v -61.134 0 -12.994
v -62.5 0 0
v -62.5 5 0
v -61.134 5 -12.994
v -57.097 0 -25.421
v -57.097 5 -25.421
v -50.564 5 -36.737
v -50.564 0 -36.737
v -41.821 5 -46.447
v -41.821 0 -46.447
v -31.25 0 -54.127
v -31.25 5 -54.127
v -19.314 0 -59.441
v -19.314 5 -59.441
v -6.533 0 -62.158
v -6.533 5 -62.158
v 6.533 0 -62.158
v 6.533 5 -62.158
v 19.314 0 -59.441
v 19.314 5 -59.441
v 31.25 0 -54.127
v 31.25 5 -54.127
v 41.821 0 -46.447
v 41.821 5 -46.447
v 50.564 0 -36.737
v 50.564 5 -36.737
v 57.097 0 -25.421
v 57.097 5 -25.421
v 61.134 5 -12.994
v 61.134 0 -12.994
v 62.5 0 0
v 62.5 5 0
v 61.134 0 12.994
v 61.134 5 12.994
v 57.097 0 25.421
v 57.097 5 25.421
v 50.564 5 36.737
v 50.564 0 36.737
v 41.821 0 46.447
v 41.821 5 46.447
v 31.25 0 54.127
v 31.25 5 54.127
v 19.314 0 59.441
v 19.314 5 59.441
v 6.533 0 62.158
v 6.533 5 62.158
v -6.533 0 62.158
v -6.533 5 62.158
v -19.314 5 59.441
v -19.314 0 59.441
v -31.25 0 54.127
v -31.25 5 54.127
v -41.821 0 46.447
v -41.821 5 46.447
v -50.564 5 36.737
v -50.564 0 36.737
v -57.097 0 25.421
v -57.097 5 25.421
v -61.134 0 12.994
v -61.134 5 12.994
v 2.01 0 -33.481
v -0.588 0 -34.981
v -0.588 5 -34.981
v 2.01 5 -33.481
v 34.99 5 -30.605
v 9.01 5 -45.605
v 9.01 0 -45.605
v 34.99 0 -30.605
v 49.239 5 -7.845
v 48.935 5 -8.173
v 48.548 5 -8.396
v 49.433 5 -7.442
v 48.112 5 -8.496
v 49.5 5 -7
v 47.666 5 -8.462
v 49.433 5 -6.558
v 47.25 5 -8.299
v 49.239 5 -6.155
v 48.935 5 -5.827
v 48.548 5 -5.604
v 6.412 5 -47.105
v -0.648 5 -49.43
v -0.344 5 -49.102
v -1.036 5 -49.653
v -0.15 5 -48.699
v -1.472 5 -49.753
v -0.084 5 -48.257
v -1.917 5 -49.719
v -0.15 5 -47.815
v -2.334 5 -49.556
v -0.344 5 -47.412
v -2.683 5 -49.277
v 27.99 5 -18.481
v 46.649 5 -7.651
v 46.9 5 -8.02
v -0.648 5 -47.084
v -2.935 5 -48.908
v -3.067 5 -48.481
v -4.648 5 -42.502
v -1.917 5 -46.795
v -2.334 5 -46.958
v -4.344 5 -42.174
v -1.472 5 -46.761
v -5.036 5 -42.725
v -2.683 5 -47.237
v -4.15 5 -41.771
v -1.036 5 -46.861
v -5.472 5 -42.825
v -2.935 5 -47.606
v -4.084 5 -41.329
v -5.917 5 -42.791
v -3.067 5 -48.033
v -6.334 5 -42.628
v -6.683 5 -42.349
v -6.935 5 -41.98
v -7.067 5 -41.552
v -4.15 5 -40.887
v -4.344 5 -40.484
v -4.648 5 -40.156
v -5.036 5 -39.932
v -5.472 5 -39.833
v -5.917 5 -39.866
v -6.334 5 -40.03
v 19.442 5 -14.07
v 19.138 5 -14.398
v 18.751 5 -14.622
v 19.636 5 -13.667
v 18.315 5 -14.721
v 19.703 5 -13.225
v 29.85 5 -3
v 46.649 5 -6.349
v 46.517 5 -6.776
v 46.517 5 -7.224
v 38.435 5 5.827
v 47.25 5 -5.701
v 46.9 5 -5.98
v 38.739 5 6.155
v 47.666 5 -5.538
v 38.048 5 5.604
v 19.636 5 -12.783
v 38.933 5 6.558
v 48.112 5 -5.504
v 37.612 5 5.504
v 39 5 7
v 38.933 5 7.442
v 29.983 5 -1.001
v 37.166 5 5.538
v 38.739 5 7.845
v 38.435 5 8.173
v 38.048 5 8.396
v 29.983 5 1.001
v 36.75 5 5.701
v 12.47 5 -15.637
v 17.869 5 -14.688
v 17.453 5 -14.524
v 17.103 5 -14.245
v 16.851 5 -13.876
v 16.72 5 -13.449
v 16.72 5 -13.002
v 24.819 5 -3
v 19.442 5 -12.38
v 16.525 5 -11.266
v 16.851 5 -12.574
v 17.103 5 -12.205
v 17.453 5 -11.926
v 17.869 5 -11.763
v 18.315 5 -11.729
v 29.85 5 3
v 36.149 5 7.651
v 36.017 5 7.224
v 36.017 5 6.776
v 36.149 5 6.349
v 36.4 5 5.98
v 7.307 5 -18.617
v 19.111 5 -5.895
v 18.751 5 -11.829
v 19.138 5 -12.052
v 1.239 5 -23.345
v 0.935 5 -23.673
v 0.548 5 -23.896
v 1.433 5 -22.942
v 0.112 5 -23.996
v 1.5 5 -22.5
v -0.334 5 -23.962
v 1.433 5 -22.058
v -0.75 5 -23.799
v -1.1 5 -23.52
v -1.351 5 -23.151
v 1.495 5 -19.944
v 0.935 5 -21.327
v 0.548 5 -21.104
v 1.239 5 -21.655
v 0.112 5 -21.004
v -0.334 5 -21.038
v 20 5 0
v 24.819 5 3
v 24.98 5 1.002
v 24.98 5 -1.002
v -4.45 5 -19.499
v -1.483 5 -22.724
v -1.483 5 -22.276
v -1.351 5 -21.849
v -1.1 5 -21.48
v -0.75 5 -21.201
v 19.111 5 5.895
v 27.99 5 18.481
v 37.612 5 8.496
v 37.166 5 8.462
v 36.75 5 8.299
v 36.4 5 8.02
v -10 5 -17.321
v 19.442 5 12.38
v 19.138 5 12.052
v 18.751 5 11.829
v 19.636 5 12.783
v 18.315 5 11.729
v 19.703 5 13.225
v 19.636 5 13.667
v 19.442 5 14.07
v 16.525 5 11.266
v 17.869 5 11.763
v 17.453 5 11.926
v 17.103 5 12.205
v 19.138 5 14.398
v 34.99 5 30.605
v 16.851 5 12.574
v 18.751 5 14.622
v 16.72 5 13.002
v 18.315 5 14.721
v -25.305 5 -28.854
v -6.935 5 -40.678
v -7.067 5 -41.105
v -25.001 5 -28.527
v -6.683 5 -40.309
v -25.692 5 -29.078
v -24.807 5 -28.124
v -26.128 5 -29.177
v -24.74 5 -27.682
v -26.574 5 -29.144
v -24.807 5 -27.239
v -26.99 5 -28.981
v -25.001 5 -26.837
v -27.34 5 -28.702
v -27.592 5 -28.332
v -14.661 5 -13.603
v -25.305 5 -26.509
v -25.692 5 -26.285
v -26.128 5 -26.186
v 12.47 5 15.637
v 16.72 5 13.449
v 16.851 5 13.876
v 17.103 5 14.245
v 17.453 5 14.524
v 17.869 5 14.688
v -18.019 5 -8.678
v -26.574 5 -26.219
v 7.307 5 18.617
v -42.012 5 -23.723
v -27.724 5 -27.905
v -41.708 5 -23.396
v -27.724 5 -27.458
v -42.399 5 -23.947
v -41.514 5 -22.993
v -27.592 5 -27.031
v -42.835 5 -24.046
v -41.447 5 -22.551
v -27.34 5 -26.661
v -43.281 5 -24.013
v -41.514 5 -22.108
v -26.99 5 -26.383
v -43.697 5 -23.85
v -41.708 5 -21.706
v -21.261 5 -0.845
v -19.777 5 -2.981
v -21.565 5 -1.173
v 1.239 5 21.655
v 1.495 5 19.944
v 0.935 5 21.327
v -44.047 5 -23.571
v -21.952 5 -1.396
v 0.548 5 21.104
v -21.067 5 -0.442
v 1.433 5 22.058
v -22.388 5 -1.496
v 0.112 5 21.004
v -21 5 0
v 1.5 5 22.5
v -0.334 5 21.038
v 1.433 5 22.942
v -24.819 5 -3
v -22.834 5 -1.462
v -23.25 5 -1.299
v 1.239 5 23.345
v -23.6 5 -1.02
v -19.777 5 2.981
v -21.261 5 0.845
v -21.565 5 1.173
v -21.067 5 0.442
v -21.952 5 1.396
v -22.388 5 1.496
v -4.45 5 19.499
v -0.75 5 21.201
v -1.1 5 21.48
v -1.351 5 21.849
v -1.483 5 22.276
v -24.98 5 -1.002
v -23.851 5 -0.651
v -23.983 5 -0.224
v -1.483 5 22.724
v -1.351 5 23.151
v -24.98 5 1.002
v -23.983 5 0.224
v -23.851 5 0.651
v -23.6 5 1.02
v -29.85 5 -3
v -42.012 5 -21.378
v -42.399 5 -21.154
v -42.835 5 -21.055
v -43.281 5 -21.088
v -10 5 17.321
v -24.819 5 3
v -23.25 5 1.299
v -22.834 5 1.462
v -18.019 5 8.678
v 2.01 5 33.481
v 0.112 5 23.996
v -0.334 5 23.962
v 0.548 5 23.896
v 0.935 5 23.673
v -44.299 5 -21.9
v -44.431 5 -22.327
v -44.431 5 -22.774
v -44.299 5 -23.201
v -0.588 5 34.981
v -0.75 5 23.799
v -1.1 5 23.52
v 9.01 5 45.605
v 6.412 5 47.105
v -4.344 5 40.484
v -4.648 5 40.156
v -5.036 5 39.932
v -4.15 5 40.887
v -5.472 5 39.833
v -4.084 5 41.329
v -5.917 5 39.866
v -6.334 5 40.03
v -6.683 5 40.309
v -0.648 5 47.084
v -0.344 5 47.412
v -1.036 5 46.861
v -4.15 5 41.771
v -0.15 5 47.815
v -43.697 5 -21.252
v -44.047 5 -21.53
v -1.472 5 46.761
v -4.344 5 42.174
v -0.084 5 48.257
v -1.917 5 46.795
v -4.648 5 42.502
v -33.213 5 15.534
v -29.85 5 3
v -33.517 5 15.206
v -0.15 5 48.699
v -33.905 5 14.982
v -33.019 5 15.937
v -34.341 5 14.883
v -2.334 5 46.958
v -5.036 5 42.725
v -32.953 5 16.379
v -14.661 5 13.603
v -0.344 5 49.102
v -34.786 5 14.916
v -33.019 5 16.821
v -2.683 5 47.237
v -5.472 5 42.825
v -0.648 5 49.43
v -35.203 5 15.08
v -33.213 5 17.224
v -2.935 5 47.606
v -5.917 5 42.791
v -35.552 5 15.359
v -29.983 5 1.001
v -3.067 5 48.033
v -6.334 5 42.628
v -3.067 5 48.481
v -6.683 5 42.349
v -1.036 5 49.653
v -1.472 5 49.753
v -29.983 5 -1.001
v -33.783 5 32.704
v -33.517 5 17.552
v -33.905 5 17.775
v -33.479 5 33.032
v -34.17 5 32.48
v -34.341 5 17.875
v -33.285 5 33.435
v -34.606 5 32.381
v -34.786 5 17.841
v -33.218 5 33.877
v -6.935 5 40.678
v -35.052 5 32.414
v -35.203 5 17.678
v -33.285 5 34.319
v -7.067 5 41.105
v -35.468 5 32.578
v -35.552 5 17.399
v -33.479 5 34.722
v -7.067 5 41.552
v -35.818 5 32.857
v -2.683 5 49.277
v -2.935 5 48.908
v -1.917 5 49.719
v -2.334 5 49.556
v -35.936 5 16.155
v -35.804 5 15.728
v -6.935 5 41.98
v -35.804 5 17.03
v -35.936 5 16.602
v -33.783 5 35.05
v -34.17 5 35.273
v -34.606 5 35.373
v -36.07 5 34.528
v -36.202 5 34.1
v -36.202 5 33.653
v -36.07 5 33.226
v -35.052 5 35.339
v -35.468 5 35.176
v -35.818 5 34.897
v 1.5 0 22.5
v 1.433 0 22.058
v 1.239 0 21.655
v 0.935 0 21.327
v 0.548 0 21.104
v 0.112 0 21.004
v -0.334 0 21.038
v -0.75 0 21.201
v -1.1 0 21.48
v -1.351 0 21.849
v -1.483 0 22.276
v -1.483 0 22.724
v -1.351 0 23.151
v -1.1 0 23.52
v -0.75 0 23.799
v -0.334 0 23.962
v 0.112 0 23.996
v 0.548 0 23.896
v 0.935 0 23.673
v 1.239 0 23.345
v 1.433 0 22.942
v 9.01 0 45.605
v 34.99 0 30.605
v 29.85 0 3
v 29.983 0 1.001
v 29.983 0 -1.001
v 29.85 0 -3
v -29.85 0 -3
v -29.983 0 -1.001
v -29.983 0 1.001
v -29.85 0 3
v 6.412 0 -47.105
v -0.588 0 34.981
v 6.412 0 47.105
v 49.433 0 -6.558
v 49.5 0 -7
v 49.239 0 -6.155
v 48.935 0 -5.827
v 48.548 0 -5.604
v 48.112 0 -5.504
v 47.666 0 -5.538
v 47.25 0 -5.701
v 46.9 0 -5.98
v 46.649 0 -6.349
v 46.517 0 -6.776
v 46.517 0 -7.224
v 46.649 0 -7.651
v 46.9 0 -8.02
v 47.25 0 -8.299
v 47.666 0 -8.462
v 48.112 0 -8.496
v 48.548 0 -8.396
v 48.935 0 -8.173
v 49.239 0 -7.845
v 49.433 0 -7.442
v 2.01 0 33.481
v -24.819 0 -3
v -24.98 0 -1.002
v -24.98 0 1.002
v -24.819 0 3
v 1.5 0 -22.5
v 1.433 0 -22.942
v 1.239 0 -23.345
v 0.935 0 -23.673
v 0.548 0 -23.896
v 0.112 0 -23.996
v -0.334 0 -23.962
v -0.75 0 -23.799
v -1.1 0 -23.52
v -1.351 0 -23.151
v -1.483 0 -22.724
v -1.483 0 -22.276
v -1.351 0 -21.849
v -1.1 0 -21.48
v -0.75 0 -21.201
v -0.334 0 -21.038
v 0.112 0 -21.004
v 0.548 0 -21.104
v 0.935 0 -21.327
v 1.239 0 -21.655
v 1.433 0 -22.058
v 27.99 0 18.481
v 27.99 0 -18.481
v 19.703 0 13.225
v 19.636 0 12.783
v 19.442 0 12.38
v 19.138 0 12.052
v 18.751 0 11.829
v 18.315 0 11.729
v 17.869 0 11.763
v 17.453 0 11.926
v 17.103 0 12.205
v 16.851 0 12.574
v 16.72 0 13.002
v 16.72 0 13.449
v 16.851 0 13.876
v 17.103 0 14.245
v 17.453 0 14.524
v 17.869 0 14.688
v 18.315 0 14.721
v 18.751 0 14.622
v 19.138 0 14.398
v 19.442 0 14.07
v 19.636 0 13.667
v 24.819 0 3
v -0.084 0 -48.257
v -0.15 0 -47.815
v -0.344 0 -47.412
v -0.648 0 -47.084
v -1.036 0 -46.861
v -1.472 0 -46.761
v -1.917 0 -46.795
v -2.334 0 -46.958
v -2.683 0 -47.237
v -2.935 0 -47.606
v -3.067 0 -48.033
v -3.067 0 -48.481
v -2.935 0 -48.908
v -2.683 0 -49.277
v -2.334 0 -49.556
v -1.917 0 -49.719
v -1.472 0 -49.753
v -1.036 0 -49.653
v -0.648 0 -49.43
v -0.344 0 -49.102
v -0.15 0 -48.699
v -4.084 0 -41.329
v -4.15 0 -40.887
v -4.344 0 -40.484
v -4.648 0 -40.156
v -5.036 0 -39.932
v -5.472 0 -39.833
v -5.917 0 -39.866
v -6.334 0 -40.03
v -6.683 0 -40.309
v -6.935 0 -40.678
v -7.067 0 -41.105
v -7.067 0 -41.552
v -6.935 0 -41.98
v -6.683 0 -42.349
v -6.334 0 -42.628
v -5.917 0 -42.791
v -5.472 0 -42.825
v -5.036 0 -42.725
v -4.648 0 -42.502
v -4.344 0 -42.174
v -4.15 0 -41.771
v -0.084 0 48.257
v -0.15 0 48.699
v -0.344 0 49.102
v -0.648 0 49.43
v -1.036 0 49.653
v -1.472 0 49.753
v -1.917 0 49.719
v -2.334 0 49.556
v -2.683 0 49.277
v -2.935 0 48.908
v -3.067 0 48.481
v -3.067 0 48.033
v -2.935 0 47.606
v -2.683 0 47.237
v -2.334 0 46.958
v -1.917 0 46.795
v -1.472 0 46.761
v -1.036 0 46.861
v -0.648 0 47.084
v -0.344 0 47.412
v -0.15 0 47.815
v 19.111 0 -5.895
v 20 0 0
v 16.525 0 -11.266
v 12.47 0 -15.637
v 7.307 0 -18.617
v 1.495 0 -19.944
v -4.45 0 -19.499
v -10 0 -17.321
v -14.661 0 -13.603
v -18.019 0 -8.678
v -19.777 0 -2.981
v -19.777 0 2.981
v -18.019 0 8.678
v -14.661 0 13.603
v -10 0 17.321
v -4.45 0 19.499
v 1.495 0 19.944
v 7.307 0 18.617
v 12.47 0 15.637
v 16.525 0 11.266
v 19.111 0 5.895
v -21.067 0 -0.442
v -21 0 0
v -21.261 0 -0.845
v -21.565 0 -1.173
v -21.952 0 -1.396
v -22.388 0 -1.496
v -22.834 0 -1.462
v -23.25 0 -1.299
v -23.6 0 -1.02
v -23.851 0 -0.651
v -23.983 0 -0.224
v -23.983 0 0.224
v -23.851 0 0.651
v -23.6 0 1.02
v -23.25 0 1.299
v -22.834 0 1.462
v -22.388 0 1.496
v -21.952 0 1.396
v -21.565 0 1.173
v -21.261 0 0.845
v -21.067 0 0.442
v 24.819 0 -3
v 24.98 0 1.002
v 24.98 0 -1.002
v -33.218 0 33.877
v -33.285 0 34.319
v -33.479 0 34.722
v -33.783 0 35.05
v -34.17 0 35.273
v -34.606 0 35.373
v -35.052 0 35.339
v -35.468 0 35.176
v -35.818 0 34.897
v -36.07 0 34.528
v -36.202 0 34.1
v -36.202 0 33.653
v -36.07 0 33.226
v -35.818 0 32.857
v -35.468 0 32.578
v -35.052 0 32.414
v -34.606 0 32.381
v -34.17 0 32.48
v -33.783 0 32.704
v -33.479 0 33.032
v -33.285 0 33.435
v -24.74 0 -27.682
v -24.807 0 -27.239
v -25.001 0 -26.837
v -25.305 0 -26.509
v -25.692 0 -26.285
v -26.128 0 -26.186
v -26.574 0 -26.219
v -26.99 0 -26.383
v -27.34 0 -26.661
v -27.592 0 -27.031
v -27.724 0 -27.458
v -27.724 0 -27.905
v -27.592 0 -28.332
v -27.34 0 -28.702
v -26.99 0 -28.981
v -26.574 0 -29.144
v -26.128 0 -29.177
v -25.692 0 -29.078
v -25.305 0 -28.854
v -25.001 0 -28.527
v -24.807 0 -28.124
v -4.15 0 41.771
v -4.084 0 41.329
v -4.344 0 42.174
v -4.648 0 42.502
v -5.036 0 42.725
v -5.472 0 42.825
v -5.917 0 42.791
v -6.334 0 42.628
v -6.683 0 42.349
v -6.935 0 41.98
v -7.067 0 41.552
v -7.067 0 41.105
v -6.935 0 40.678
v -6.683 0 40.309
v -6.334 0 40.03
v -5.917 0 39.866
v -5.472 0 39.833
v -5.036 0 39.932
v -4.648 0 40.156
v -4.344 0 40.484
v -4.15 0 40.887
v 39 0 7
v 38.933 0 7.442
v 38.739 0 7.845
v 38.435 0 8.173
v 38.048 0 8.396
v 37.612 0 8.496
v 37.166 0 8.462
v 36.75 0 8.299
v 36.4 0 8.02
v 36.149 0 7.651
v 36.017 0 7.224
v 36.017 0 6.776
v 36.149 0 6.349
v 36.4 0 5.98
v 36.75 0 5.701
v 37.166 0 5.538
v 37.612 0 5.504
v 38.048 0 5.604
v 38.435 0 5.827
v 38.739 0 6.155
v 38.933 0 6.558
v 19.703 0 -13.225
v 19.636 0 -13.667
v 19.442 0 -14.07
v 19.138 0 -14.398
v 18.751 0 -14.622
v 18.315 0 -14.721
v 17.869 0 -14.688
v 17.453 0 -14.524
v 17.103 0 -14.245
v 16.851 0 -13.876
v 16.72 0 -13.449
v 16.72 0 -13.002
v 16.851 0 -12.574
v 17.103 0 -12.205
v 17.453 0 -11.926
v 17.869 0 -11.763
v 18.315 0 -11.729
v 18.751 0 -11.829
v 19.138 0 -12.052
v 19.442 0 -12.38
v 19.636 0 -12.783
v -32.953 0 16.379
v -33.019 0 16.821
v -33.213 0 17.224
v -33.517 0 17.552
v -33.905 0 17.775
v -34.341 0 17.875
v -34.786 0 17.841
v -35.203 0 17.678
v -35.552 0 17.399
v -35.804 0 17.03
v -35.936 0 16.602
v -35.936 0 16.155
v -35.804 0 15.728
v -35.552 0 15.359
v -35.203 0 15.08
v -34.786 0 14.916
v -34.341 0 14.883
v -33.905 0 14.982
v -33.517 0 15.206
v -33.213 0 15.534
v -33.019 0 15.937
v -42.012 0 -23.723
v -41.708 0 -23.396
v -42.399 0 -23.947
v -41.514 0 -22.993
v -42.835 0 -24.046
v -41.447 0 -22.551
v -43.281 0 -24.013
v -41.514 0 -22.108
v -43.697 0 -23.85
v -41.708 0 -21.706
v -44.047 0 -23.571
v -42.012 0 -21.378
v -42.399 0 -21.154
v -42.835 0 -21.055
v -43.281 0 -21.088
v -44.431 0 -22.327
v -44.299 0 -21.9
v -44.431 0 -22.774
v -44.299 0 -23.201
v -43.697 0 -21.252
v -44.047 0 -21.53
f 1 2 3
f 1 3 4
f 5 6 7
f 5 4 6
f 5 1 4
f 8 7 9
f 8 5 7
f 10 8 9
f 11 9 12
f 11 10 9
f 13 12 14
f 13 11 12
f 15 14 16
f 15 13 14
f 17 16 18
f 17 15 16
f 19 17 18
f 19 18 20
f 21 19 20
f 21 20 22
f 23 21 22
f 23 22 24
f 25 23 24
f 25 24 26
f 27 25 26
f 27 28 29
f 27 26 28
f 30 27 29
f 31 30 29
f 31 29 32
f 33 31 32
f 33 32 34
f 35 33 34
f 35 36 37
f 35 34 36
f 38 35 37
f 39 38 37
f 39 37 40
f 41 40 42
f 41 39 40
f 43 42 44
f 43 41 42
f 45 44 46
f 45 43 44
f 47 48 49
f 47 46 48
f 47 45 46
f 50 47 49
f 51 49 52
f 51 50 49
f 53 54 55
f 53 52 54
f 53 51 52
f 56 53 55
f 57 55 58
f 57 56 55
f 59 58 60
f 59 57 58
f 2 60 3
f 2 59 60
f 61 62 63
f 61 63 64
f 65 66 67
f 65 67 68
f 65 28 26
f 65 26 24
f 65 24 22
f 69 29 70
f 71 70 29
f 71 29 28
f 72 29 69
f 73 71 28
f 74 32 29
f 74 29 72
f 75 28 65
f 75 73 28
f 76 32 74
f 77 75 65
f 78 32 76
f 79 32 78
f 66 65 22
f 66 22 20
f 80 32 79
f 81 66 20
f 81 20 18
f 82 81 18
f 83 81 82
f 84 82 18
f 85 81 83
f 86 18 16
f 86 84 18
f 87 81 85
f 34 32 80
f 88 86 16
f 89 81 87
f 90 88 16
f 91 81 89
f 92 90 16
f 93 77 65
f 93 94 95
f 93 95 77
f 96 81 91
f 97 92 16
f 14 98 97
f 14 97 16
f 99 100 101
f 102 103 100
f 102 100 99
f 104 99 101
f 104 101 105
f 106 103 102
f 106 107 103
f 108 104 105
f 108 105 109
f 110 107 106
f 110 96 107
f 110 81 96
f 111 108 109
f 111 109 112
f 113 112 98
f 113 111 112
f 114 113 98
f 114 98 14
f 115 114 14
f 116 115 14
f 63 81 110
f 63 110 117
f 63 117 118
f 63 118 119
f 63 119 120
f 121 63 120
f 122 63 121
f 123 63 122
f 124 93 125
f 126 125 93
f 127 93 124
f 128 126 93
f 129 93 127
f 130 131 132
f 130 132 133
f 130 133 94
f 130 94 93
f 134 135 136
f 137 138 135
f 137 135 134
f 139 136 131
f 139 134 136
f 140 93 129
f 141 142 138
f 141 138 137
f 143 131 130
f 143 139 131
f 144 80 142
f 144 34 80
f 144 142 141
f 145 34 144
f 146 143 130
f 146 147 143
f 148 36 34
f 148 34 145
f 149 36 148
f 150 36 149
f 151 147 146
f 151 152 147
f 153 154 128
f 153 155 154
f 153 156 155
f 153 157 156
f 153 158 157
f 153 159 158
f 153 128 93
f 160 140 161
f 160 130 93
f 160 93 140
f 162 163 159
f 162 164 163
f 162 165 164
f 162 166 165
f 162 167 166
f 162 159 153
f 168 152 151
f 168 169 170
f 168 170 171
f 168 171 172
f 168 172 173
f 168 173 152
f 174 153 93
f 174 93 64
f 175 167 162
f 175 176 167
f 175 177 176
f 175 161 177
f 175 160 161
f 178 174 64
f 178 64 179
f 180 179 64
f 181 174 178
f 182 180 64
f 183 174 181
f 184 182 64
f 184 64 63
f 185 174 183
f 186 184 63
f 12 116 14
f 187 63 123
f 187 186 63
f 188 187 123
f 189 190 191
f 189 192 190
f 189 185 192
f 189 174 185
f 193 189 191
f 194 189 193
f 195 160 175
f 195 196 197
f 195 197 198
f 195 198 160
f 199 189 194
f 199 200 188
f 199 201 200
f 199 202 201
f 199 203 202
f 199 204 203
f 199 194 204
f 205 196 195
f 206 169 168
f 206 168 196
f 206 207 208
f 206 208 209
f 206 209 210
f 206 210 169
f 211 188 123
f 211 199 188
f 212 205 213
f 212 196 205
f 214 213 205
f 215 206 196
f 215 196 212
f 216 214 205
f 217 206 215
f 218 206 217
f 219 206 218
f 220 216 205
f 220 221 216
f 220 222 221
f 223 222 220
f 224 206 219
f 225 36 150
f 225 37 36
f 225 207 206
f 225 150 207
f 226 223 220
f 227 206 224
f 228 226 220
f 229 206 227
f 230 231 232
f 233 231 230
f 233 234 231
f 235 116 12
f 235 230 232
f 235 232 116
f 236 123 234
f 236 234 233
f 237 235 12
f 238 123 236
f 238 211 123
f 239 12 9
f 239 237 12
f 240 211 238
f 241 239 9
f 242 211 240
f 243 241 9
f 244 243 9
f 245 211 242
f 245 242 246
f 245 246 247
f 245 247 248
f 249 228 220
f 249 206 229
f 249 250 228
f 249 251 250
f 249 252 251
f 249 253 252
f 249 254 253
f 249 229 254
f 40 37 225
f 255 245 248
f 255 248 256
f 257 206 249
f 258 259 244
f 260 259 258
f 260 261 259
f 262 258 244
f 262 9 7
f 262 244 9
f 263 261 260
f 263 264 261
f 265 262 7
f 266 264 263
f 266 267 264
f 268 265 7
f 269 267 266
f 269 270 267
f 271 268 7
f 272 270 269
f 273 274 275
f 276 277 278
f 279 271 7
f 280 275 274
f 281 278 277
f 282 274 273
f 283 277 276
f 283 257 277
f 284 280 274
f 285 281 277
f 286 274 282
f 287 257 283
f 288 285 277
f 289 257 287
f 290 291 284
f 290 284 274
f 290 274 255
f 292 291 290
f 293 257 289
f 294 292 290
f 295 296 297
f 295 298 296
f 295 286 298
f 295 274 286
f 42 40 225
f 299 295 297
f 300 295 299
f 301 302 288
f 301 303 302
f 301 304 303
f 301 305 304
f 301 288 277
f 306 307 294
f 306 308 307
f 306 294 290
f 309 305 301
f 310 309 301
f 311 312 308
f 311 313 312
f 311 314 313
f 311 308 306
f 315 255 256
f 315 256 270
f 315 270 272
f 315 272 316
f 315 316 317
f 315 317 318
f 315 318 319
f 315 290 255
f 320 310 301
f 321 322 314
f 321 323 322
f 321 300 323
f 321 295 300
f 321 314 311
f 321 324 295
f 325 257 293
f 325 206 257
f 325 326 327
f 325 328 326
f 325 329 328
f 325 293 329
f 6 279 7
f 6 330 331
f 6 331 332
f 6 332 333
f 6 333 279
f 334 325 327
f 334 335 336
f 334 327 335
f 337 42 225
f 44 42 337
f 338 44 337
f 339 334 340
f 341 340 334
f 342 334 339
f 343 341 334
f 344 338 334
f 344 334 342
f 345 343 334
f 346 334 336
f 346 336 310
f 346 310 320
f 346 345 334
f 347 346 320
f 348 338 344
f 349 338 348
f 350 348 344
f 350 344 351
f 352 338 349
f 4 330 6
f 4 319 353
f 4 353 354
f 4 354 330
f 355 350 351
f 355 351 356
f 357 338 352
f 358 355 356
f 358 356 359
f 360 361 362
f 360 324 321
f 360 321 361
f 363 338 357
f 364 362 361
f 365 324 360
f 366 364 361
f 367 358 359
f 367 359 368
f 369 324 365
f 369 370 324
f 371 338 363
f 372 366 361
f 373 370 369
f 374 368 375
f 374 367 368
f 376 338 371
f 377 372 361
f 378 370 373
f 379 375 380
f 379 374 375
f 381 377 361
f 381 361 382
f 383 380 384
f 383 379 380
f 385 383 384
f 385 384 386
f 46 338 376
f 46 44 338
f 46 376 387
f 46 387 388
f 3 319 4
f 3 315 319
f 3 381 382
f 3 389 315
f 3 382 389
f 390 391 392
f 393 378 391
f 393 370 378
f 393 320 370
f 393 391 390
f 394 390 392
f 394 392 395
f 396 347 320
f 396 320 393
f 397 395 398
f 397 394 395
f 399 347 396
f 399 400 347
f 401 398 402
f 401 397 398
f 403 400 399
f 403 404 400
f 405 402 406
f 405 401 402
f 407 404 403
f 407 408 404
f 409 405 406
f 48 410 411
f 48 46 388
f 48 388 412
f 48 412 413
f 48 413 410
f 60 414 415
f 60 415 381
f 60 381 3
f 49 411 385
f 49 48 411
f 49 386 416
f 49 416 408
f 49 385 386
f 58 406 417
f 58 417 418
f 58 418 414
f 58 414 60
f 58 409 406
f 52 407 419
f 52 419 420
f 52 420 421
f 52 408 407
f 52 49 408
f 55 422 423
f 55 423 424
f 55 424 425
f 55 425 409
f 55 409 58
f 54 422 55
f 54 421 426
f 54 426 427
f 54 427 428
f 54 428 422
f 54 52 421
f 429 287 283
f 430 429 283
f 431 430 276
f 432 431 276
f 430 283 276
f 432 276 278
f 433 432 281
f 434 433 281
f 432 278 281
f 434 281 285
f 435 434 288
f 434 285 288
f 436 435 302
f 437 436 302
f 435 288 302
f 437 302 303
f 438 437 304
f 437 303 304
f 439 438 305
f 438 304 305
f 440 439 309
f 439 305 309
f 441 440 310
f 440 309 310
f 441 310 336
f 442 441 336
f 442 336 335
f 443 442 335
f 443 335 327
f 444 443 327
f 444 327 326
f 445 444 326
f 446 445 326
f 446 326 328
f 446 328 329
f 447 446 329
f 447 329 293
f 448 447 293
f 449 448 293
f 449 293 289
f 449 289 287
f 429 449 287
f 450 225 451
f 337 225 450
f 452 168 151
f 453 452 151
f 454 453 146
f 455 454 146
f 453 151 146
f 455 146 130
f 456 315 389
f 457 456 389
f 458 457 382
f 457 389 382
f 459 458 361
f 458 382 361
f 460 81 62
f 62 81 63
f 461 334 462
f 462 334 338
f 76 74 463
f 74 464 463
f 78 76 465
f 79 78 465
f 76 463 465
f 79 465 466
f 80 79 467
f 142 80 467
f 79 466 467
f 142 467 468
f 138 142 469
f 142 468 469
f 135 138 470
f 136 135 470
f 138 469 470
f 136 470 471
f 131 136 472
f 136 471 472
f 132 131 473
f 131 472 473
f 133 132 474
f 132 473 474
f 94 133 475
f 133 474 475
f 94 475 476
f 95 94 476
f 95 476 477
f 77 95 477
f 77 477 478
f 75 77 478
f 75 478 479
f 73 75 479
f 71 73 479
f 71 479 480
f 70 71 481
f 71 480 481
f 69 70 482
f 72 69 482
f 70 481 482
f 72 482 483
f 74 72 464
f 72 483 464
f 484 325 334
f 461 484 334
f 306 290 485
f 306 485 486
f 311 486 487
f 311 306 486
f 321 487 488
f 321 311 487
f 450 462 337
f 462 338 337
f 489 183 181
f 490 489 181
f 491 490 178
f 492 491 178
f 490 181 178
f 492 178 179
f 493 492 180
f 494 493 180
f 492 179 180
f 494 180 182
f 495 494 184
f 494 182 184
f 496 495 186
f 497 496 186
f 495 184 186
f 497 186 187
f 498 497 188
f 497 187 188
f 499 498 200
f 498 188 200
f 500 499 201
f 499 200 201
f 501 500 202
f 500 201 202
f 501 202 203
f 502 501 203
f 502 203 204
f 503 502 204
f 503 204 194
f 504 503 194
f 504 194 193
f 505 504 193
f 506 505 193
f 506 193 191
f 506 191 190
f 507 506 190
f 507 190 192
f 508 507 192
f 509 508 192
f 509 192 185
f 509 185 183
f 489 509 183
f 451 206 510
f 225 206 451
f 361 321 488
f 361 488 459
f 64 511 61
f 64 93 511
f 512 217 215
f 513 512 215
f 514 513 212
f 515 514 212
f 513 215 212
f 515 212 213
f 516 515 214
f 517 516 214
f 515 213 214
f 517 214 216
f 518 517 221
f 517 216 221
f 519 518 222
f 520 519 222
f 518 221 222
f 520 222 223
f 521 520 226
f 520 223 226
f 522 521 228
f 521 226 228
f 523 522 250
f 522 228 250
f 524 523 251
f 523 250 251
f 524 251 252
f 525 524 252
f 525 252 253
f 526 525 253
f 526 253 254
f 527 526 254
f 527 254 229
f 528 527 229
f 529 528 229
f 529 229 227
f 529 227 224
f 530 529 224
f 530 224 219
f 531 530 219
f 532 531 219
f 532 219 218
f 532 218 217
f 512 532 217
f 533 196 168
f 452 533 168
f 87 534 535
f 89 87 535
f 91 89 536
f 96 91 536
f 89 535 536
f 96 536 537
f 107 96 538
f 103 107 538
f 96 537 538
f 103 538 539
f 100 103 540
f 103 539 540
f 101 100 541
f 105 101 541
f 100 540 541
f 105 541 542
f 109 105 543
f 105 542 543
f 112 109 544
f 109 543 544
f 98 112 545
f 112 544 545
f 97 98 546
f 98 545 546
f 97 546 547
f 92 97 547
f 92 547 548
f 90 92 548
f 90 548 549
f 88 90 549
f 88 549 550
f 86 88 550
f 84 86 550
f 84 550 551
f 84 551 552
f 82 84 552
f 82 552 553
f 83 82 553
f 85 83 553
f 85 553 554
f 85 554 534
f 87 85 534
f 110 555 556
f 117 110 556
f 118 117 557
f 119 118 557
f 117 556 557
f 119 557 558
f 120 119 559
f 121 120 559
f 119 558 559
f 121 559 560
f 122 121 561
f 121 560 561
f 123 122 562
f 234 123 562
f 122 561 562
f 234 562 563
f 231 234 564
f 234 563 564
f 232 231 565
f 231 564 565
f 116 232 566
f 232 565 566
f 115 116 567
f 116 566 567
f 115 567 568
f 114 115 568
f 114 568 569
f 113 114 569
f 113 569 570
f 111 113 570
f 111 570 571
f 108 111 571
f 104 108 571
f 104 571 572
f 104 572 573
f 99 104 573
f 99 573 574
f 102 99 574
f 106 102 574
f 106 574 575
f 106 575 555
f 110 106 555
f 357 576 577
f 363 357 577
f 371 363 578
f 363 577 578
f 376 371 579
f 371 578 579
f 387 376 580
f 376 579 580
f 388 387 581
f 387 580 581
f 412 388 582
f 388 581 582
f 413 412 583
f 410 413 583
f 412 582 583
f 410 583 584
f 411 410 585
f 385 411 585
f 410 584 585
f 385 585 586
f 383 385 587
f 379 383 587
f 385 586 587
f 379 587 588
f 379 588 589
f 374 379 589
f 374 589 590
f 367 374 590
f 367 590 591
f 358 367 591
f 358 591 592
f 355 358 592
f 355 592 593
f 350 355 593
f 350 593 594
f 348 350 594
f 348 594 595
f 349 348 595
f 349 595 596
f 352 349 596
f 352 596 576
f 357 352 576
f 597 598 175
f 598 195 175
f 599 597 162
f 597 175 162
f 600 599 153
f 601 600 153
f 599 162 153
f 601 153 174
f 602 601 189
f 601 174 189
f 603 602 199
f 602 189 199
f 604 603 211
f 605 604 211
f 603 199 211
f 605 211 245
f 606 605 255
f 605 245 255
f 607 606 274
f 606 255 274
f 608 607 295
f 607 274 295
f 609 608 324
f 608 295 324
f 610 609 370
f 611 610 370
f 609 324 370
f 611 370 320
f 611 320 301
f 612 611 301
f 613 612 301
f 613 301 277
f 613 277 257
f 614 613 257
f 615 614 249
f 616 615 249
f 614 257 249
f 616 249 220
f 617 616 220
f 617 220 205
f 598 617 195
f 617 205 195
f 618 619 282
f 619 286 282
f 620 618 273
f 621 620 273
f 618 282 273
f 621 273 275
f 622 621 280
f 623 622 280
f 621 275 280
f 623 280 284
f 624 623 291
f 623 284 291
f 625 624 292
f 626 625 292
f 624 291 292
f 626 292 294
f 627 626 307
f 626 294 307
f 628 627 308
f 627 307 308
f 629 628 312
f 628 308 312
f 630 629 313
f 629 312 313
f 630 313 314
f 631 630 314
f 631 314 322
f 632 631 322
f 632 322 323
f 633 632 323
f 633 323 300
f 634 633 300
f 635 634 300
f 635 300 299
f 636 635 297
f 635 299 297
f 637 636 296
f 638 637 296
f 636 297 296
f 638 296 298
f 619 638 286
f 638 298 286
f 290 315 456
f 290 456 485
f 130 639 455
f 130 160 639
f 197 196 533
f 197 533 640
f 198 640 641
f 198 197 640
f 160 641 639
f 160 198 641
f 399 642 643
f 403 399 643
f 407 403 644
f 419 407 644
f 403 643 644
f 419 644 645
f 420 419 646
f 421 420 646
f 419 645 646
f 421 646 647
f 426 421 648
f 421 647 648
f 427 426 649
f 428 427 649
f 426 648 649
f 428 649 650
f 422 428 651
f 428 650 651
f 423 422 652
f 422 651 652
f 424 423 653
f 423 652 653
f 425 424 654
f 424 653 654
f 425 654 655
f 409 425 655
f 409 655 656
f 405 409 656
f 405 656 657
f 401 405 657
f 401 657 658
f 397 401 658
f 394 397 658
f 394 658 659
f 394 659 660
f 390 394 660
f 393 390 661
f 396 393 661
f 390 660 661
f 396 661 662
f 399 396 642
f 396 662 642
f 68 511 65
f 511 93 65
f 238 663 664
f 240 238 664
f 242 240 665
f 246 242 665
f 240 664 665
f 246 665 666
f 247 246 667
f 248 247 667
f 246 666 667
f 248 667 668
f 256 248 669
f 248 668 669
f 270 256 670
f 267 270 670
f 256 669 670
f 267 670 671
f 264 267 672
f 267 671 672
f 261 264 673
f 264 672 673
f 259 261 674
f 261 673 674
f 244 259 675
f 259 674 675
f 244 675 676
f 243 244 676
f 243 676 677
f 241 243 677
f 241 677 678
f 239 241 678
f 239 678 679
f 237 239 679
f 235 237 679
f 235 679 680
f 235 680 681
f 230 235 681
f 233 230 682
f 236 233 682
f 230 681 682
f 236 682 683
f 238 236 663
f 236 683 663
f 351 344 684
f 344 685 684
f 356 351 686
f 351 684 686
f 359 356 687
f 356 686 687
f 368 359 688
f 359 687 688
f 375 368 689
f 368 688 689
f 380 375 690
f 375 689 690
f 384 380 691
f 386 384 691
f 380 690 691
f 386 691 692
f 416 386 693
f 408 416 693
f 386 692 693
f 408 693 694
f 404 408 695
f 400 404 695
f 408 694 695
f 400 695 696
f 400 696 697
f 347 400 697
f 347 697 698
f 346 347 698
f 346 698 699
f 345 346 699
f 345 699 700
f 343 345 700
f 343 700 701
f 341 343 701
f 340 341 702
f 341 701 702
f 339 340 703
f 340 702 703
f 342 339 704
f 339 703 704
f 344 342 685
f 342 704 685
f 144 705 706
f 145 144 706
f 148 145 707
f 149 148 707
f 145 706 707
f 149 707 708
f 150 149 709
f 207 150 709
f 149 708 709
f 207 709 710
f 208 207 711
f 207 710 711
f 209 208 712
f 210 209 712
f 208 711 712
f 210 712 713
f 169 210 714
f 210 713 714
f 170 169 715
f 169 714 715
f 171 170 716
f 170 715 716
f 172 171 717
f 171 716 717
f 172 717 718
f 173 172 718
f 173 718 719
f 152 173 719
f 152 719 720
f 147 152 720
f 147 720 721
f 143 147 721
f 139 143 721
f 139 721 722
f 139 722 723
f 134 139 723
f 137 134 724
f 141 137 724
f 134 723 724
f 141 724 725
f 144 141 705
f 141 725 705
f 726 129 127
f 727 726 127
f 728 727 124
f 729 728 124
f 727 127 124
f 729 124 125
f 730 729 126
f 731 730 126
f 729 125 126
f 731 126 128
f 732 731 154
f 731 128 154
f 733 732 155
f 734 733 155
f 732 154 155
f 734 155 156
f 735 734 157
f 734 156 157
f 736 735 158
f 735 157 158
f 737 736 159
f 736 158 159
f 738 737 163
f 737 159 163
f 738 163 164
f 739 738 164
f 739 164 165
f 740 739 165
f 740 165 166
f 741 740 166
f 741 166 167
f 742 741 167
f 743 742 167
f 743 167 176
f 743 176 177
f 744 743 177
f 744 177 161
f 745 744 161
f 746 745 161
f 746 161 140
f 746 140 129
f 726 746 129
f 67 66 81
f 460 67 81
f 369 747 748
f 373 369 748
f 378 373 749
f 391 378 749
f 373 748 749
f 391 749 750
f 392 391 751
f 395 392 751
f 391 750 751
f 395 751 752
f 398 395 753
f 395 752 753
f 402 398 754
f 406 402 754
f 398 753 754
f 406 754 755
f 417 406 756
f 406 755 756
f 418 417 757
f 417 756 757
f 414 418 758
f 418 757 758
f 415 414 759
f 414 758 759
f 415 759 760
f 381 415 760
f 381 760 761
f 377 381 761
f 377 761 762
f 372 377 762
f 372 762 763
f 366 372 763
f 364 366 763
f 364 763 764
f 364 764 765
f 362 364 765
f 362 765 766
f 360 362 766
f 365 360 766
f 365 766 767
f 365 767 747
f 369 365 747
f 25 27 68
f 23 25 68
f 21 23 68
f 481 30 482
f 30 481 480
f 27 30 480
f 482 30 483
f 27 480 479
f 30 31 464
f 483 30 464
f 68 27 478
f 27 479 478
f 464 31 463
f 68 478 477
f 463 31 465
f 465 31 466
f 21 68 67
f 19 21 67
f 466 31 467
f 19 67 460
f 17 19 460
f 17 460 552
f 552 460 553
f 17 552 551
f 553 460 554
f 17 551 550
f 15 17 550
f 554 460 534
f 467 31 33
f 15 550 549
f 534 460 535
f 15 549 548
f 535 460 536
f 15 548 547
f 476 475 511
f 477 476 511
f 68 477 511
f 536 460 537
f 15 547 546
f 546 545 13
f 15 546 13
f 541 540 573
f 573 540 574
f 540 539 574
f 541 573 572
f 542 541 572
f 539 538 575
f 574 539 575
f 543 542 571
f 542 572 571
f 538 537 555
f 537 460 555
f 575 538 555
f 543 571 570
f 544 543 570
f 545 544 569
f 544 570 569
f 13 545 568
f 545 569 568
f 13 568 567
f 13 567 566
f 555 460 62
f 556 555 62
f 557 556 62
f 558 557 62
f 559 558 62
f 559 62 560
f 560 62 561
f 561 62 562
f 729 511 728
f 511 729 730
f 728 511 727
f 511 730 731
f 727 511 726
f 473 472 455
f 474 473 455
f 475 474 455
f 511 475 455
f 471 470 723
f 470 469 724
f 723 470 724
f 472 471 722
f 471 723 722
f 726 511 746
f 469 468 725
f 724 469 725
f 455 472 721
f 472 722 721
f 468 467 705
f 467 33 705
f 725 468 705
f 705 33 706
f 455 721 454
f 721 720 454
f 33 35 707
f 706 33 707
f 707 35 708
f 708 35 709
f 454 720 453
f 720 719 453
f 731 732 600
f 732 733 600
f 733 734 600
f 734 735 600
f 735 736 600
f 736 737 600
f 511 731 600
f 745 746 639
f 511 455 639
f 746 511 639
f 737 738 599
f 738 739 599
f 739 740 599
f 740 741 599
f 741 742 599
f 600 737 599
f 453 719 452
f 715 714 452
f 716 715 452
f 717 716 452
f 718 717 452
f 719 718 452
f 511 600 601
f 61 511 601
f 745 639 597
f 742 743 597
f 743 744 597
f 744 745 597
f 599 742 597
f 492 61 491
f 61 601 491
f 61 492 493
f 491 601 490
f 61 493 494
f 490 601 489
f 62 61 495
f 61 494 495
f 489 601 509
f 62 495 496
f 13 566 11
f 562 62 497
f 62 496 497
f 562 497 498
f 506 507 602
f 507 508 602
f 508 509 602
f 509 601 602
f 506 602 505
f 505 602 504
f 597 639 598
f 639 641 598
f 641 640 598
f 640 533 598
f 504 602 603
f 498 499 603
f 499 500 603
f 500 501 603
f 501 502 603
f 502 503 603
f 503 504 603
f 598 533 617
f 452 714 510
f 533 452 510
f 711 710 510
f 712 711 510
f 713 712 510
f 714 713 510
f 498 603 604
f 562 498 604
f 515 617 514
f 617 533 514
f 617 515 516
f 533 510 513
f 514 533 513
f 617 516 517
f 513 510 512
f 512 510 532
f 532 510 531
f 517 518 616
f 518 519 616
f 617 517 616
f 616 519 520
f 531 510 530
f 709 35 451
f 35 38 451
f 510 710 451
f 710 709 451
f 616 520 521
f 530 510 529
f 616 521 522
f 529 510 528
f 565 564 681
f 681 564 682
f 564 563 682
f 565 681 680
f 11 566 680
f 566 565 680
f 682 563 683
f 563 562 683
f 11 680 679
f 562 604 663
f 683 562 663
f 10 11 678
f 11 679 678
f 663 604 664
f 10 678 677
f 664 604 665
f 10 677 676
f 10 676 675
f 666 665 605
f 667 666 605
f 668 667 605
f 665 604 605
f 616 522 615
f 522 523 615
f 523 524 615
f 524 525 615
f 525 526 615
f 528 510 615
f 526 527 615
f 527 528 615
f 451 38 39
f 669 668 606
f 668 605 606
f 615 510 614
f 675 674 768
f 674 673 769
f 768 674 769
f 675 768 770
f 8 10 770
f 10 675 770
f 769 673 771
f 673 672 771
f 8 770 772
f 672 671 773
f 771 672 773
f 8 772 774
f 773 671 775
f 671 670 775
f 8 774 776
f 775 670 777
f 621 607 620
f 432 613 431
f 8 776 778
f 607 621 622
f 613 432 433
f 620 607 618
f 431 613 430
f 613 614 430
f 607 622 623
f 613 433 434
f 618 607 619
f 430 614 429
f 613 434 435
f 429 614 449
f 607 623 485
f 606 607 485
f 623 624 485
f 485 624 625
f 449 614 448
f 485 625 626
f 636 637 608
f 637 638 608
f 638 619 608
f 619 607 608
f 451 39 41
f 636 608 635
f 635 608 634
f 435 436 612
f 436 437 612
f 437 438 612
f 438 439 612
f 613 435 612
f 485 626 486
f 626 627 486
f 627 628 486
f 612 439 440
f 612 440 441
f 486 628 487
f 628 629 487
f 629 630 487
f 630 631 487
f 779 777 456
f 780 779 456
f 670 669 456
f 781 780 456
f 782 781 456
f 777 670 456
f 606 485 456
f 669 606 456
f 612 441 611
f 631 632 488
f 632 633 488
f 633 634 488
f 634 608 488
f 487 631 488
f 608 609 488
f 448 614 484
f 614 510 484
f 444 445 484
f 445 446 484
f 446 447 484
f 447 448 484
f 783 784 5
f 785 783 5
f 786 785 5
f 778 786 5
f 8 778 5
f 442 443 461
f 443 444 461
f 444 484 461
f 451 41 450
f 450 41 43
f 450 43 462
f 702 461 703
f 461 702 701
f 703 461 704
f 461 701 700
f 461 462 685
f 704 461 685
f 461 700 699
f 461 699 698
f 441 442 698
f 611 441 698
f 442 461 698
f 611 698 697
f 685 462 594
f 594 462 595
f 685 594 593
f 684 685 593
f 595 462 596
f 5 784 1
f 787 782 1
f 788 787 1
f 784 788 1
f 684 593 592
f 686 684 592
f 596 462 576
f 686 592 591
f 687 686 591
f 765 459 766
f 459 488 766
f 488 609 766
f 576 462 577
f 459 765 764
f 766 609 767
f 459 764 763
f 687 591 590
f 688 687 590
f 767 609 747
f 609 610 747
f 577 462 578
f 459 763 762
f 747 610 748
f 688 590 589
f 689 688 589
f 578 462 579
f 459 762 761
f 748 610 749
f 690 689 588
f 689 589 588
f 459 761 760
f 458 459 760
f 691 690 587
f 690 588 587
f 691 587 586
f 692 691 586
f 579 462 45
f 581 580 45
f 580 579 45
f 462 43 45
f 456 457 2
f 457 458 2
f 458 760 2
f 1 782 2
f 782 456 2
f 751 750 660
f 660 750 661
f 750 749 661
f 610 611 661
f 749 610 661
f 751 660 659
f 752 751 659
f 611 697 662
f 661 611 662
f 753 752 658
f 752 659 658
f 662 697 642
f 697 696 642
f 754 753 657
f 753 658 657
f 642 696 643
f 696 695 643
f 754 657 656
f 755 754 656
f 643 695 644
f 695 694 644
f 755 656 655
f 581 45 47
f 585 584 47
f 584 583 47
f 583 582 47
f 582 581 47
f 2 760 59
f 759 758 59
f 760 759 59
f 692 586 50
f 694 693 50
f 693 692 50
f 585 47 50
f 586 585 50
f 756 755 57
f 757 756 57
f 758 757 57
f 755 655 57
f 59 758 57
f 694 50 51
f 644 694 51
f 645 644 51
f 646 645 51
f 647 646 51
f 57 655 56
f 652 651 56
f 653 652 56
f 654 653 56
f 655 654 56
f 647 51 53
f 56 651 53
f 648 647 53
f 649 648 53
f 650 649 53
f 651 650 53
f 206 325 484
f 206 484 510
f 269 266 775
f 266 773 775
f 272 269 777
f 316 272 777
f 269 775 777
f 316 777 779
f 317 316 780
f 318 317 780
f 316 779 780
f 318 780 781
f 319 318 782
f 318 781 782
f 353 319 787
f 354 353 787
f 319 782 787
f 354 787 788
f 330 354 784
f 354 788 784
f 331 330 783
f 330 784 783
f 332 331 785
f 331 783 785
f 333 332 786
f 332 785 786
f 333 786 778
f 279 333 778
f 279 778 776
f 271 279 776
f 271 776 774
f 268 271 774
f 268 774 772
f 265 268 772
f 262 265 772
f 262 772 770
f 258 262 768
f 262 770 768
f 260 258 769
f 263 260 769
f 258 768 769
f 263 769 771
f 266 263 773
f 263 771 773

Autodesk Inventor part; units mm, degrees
ref_plane "YZ Plane" through (0, 0, 0) normal (1, 0, 0) x (0, 1, 0)
ref_plane "XZ Plane" through (0, 0, 0) normal (0, 1, 0) x (-1, 0, 0)
ref_plane "XY Plane" through (0, 0, 0) normal (0, 0, 1) x (1, 0, 0)
sketch "Sketch1" plane through (0, 0, 0) normal (0, 1, 0) x (-1, 0, 0)
  line L0 (0, 0) -> (50, 0) construction
  line L1 (0, 0) -> (50, 0) construction
  line L2 (0, 0) -> (-36, 0)
  circle A0 centre (0, 0) radius 25
  line L3 (-60, -10) -> (-60, 10)
  circle A1 centre (0, 0) radius 61
  circle A2 centre (0, 0) radius 62.5
  point P0 (62.509, -33.0548)
  point P1 (12.6591, 21.558)
  point P2 (24.4148, 5.3777)
  point P3 (24.4148, -5.3777)
  point P4 (-22.9129, 10)
  point P5 (-22.9129, -10)
  point P6 (12.6591, -21.558)
  dimension "d2" = 36
  dimension "d3" = 50
  dimension "d26" = 122
  dimension "d154" = 125
extrude "Extrusion1" add sketch "Sketch1" along normal blind 5 contours A0 | A1 | A2
sketch "Sketch2" plane through (0, 5, 0) normal (0, 1, 0) x (1, 0, 0)
  circle A0 centre (0, 0) radius 20
  dimension "d6" = 40
extrude "Extrusion2" cut sketch "Sketch2" against normal up to next
sketch "Sketch3" plane through (0, 5, 0) normal (0, 1, 0) x (1, 0, 0)
  line L0 (22.1416, 4) -> (20.8701, 4)
  line L1 (22.1416, -4) -> (20.8701, -4)
  line L2 (24.6779, 4) -> (22.1416, 4)
  line L3 (24.6779, -4) -> (22.1416, -4)
  line L4 (-15.5618, -16.2506) -> (-14.5332, -15.5032)
  line L5 (-15.5618, 16.2506) -> (-14.5332, 15.5032)
  line L6 (-20.2641, -9.7784) -> (-19.2354, -9.0311)
  line L7 (-17.6137, -17.7414) -> (-15.5618, -16.2506)
  line L8 (-22.316, -11.2693) -> (-20.2641, -9.7784)
  line L9 (-20.2641, 9.7784) -> (-19.2354, 9.0311)
  line L10 (-17.6137, 17.7414) -> (-15.5618, 16.2506)
  line L11 (-22.316, 11.2693) -> (-20.2641, 9.7784)
  line L12 (-23.5374, 22.0452) -> (-13.679, 22.0452) construction
  arc A0 (-17.6137, -17.7414) -> (24.6779, -4) centre (0, 0) ccw
  arc A1 (24.6779, 4) -> (-17.6137, 17.7414) centre (0, 0) ccw
  arc A2 (-22.316, 11.2693) -> (-22.316, -11.2693) centre (0, 0) ccw
  line L13 (20.8701, 4) -> (15.8701, 4)
  line L14 (15.8701, 4) -> (15.8701, -4)
  line L15 (15.8701, -4) -> (20.8701, -4)
  line L16 (-14.5332, 15.5032) -> (-10.4881, 12.5643)
  line L17 (-10.4881, 12.5643) -> (-15.1903, 6.0922)
  line L18 (-15.1903, 6.0922) -> (-19.2354, 9.0311)
  line L19 (-19.2354, -9.0311) -> (-15.1903, -6.0922)
  line L20 (-15.1903, -6.0922) -> (-10.4881, -12.5643)
  line L21 (-10.4881, -12.5643) -> (-14.5332, -15.5032)
  circle A3 centre (-22.5, 0) radius 1.5
  circle A4 centre (0, 22.5) radius 1.5
  circle A5 centre (18.2029, 13.2252) radius 1.5
  circle A6 centre (18.2029, -13.2252) radius 1.5
  circle A7 centre (0, -22.5) radius 1.5
  circle A8 centre (0, 0) radius 4
  line L22 (0, 0) -> (8, 0)
  line L23 (8, 0) -> (8, 7.5)
  line L24 (8, 0) -> (8, -7.5)
  circle A9 centre (8, -7.5) radius 2.5
  circle A10 centre (8, 7.5) radius 2.5
  point P0 (-23.5374, -22.0452)
  point P1 (-28.2397, -15.5731)
  dimension "d9" = 36
  dimension "d10" = 5
  dimension "d11" = 5
  dimension "d12" = 3
  dimension "d13" = 3
  dimension "d14" = 3
  dimension "d15" = 3
  dimension "d16" = 3
  dimension "d17" = 8
  dimension "d18" = 8
  dimension "d19" = 7.5
  dimension "d20" = 7.5
  dimension "d21" = 5
  dimension "d22" = 5
extrude "Extrusion3" cut sketch "Sketch3" against normal up to next contours A3 | A4 | A5 | A6 | A7
sketch "Sketch5" plane through (0, 5, 0) normal (0, 1, 0) x (1, 0, 0)
  line L0 (0, 0) -> (37.5601, 0) construction
  circle A0 centre (0, 0) radius 25
  line L1 (0, 0) -> (15.7675, -27.31)
  line L2 (0, 0) -> (31.5349, 0) construction
  line L3 (0, 0) -> (19.8269, 34.3411)
  line L4 (0, 0) -> (39.6537, 0) construction
  line L5 (12.5, 21.6506) -> (15, 25.9808)
  line L6 (12.5, -21.6506) -> (15, -25.9808)
  line L7 (15, -25.9808) -> (27.9904, -18.4808)
  line L8 (27.9904, -18.4808) -> (34.9904, -30.6051)
  line L9 (34.9904, -30.6051) -> (22, -38.1051)
  line L10 (22, -38.1051) -> (15, -25.9808)
  line L11 (22, -38.1051) -> (15, -25.9808)
  line L12 (15, -25.9808) -> (2.0096, -33.4808)
  line L13 (2.0096, -33.4808) -> (9.0096, -45.6051)
  line L14 (9.0096, -45.6051) -> (22, -38.1051)
  line L15 (15, 25.9808) -> (2.0096, 33.4808)
  line L16 (2.0096, 33.4808) -> (9.0096, 45.6051)
  line L17 (9.0096, 45.6051) -> (22, 38.1051)
  line L18 (22, 38.1051) -> (15, 25.9808)
  line L19 (22, 38.1051) -> (15, 25.9808)
  line L20 (15, 25.9808) -> (27.9904, 18.4808)
  line L21 (27.9904, 18.4808) -> (34.9904, 30.6051)
  line L22 (34.9904, 30.6051) -> (22, 38.1051)
  dimension "d41" = 50
  dimension "d47" = 60
  dimension "d48" = 60
  dimension "d49" = 5
  dimension "d50" = 5
  dimension "d51" = 15
  dimension "d52" = 14
  dimension "d53" = 15
  dimension "d54" = 15
  dimension "d55" = 14
  dimension "d56" = 15
extrude "Extrusion5" cut sketch "Sketch5" against normal up to next contours L7 L8 L9 L10 L1 | L1 L10 L14 L13 L12 | L15 L16 L17 L18 L3 | L3 L18 L22 L21 L20
sketch "Sketch8" plane through (0, 0, 0) normal (0, -1, 0) x (1, 0, 0)
  line L0 (-37.9479, -22.6265) -> (-41.4746, -17.7724)
  line L1 (-47.9467, -22.4747) -> (-44.42, -27.3288)
  line L2 (-31.2231, -27.6292) -> (-27.6611, -32.4577)
  circle A0 centre (-42.9473, -22.5506) radius 1.5
  circle A1 centre (-26.2405, -27.6816) radius 1.5
  line L3 (-29.7189, 33.9527) -> (-36.191, 38.655)
  line L4 (-39.7177, 33.8009) -> (-33.2456, 29.0986)
  line L5 (-29.4532, 16.4547) -> (-35.9253, 21.157)
  line L6 (41.5, 10) -> (33.5, 10)
  line L7 (33.5, 4) -> (41.5, 4)
  line L8 (44, -10) -> (52, -10)
  circle A2 centre (48, -7) radius 1.5
  circle A3 centre (37.5, 7) radius 1.5
  circle A4 centre (-34.7183, 33.8768) radius 1.5
  circle A5 centre (-34.4526, 16.3788) radius 1.5
  point P0 (0, 0)
  point P1 (0, 0)
  point P2 (-32.9799, 11.6006)
  point P3 (44, -4)
  dimension "d73" = 3
  dimension "d74" = 3
  dimension "d75" = 3
  dimension "d76" = 3
  dimension "d77" = 3
extrude "Extrusion8" cut sketch "Sketch8" against normal blind 5
sketch "Sketch9" plane through (0, 5, 0) normal (0, 1, 0) x (1, 0, 0)
  line L0 (2.0096, -33.4808) -> (27.9904, -18.4808) projected
  line L1 (9.0096, -45.6051) -> (2.0096, -33.4808)
  line L2 (2.0096, -33.4808) -> (-0.5885, -34.9808)
  line L3 (-0.5885, -34.9808) -> (6.4115, -47.1051)
  line L4 (6.4115, -47.1051) -> (9.0096, -45.6051)
  line L5 (2.0096, 33.4808) -> (9.0096, 45.6051) projected
  line L6 (2.0096, 33.4808) -> (9.0096, 45.6051)
  line L7 (9.0096, 45.6051) -> (6.4115, 47.1051)
  line L8 (6.4115, 47.1051) -> (-0.5885, 34.9808)
  line L9 (-0.5885, 34.9808) -> (2.0096, 33.4808)
  point P0 (0, 0)
  dimension "d80" = 3
  dimension "d81" = 3
extrude "Extrusion9" cut sketch "Sketch9" against normal blind 10
sketch "Sketch10" plane through (0, 0, 0) normal (0, -1, 0) x (1, 0, 0)
  line L0 (6.4115, 47.1051) -> (-9.1769, 56.1051)
  line L1 (-9.1769, 56.1051) -> (-16.1769, 43.9808)
  line L2 (-16.1769, 43.9808) -> (-0.5885, 34.9808)
  line L3 (-9.1769, 56.1051) -> (-11.1769, 52.641)
  line L4 (-16.1769, 43.9808) -> (-14.1769, 47.4449)
  line L5 (-0.5885, 34.9808) -> (1.4115, 38.4449)
  line L6 (1.4115, 38.4449) -> (-2.0526, 40.4449)
  line L7 (6.4115, 47.1051) -> (4.4115, 43.641)
  line L8 (-0.5885, 34.9808) -> (6.4115, 47.1051) projected
  line L9 (4.4115, 43.641) -> (0.9474, 45.641)
  line L10 (27.9904, -18.4808) -> (-0.5885, -34.9808) projected
  line L11 (-16.1769, -43.9808) -> (-9.1769, -56.1051)
  line L12 (6.4115, -47.1051) -> (-0.5885, -34.9808)
  line L13 (-16.1769, -43.9808) -> (-14.1769, -47.4449)
  line L14 (-14.1769, -47.4449) -> (-10.7128, -45.4449)
  line L15 (-9.1769, -56.1051) -> (-11.1769, -52.641)
  line L16 (6.4115, -47.1051) -> (4.4115, -43.641)
  line L17 (-0.5885, -34.9808) -> (6.4115, -47.1051) projected
  line L18 (-0.5885, -34.9808) -> (1.4115, -38.4449)
  line L19 (6.4115, 47.1051) -> (3.8135, 48.6051)
  line L20 (3.8135, 48.6051) -> (-3.1865, 36.4808)
  line L21 (3.8135, 48.6051) -> (-2.6817, 52.3551)
  line L22 (1.8135, 45.141) -> (-2.0836, 47.391)
  line L23 (-2.0836, 47.391) -> (-5.0836, 42.1949)
  line L24 (-0.5885, -34.9808) -> (1.4115, -38.4449)
  line L25 (6.4115, -47.1051) -> (4.4115, -43.641)
  circle A0 centre (-5.5836, -41.3288) radius 1.5
  circle A1 centre (-1.5836, -48.257) radius 1.5
  line L26 (-2.0836, 47.391) -> (-1.5836, 48.257)
  line L27 (-5.0836, 42.1949) -> (-5.5836, 41.3288)
  circle A2 centre (-1.5836, 48.257) radius 1.5
  circle A3 centre (-5.5836, 41.3288) radius 1.5
  point P0 (0, 0)
  dimension "d85" = 14
  dimension "d86" = 4
  dimension "d88" = 4
  dimension "d92" = 4
  dimension "d93" = 4
  dimension "d94" = 4
  dimension "d95" = 4
  dimension "d98" = 18
  dimension "d99" = 4
  dimension "d101" = 4
  dimension "d103" = 4
  dimension "d129" = 3
  dimension "d130" = 7.5
  dimension "d137" = 4.5
  dimension "d140" = 4
  dimension "d146" = 3
  dimension "d148" = 1
  dimension "d149" = 1
  dimension "d150" = 3
  dimension "d151" = 3
extrude "Extrusion13" cut sketch "Sketch10" against normal blind 10 contours A2 L23 L22 | L22 L23 A2 | A0 | A1 | A3
sketch "Sketch11" plane through (0, 5, 0) normal (0, 1, 0) x (1, 0, 0)
  circle A0 centre (0, 0) radius 30
  circle A1 centre (0, 0) radius 30
  circle A2 centre (0, 0) radius 25
  circle A3 centre (0, 0) radius 25
  line L0 (-25, -3) -> (-29.8496, -3)
  line L1 (-24.8193, -3) -> (-25, -3)
  line L2 (-25, 3) -> (-24.8193, 3)
  line L3 (-29.8496, 3) -> (-24.8193, 3)
  line L4 (24.8193, -3) -> (29.8496, -3)
  line L5 (24.8193, 3) -> (29.8496, 3)
extrude "Extrusion14" cut sketch "Sketch11" against normal blind 5 contours A0 L4 A2 L5 | L3 L2 A2 L1 L0 A0
properties part number "upperBasePart2"
